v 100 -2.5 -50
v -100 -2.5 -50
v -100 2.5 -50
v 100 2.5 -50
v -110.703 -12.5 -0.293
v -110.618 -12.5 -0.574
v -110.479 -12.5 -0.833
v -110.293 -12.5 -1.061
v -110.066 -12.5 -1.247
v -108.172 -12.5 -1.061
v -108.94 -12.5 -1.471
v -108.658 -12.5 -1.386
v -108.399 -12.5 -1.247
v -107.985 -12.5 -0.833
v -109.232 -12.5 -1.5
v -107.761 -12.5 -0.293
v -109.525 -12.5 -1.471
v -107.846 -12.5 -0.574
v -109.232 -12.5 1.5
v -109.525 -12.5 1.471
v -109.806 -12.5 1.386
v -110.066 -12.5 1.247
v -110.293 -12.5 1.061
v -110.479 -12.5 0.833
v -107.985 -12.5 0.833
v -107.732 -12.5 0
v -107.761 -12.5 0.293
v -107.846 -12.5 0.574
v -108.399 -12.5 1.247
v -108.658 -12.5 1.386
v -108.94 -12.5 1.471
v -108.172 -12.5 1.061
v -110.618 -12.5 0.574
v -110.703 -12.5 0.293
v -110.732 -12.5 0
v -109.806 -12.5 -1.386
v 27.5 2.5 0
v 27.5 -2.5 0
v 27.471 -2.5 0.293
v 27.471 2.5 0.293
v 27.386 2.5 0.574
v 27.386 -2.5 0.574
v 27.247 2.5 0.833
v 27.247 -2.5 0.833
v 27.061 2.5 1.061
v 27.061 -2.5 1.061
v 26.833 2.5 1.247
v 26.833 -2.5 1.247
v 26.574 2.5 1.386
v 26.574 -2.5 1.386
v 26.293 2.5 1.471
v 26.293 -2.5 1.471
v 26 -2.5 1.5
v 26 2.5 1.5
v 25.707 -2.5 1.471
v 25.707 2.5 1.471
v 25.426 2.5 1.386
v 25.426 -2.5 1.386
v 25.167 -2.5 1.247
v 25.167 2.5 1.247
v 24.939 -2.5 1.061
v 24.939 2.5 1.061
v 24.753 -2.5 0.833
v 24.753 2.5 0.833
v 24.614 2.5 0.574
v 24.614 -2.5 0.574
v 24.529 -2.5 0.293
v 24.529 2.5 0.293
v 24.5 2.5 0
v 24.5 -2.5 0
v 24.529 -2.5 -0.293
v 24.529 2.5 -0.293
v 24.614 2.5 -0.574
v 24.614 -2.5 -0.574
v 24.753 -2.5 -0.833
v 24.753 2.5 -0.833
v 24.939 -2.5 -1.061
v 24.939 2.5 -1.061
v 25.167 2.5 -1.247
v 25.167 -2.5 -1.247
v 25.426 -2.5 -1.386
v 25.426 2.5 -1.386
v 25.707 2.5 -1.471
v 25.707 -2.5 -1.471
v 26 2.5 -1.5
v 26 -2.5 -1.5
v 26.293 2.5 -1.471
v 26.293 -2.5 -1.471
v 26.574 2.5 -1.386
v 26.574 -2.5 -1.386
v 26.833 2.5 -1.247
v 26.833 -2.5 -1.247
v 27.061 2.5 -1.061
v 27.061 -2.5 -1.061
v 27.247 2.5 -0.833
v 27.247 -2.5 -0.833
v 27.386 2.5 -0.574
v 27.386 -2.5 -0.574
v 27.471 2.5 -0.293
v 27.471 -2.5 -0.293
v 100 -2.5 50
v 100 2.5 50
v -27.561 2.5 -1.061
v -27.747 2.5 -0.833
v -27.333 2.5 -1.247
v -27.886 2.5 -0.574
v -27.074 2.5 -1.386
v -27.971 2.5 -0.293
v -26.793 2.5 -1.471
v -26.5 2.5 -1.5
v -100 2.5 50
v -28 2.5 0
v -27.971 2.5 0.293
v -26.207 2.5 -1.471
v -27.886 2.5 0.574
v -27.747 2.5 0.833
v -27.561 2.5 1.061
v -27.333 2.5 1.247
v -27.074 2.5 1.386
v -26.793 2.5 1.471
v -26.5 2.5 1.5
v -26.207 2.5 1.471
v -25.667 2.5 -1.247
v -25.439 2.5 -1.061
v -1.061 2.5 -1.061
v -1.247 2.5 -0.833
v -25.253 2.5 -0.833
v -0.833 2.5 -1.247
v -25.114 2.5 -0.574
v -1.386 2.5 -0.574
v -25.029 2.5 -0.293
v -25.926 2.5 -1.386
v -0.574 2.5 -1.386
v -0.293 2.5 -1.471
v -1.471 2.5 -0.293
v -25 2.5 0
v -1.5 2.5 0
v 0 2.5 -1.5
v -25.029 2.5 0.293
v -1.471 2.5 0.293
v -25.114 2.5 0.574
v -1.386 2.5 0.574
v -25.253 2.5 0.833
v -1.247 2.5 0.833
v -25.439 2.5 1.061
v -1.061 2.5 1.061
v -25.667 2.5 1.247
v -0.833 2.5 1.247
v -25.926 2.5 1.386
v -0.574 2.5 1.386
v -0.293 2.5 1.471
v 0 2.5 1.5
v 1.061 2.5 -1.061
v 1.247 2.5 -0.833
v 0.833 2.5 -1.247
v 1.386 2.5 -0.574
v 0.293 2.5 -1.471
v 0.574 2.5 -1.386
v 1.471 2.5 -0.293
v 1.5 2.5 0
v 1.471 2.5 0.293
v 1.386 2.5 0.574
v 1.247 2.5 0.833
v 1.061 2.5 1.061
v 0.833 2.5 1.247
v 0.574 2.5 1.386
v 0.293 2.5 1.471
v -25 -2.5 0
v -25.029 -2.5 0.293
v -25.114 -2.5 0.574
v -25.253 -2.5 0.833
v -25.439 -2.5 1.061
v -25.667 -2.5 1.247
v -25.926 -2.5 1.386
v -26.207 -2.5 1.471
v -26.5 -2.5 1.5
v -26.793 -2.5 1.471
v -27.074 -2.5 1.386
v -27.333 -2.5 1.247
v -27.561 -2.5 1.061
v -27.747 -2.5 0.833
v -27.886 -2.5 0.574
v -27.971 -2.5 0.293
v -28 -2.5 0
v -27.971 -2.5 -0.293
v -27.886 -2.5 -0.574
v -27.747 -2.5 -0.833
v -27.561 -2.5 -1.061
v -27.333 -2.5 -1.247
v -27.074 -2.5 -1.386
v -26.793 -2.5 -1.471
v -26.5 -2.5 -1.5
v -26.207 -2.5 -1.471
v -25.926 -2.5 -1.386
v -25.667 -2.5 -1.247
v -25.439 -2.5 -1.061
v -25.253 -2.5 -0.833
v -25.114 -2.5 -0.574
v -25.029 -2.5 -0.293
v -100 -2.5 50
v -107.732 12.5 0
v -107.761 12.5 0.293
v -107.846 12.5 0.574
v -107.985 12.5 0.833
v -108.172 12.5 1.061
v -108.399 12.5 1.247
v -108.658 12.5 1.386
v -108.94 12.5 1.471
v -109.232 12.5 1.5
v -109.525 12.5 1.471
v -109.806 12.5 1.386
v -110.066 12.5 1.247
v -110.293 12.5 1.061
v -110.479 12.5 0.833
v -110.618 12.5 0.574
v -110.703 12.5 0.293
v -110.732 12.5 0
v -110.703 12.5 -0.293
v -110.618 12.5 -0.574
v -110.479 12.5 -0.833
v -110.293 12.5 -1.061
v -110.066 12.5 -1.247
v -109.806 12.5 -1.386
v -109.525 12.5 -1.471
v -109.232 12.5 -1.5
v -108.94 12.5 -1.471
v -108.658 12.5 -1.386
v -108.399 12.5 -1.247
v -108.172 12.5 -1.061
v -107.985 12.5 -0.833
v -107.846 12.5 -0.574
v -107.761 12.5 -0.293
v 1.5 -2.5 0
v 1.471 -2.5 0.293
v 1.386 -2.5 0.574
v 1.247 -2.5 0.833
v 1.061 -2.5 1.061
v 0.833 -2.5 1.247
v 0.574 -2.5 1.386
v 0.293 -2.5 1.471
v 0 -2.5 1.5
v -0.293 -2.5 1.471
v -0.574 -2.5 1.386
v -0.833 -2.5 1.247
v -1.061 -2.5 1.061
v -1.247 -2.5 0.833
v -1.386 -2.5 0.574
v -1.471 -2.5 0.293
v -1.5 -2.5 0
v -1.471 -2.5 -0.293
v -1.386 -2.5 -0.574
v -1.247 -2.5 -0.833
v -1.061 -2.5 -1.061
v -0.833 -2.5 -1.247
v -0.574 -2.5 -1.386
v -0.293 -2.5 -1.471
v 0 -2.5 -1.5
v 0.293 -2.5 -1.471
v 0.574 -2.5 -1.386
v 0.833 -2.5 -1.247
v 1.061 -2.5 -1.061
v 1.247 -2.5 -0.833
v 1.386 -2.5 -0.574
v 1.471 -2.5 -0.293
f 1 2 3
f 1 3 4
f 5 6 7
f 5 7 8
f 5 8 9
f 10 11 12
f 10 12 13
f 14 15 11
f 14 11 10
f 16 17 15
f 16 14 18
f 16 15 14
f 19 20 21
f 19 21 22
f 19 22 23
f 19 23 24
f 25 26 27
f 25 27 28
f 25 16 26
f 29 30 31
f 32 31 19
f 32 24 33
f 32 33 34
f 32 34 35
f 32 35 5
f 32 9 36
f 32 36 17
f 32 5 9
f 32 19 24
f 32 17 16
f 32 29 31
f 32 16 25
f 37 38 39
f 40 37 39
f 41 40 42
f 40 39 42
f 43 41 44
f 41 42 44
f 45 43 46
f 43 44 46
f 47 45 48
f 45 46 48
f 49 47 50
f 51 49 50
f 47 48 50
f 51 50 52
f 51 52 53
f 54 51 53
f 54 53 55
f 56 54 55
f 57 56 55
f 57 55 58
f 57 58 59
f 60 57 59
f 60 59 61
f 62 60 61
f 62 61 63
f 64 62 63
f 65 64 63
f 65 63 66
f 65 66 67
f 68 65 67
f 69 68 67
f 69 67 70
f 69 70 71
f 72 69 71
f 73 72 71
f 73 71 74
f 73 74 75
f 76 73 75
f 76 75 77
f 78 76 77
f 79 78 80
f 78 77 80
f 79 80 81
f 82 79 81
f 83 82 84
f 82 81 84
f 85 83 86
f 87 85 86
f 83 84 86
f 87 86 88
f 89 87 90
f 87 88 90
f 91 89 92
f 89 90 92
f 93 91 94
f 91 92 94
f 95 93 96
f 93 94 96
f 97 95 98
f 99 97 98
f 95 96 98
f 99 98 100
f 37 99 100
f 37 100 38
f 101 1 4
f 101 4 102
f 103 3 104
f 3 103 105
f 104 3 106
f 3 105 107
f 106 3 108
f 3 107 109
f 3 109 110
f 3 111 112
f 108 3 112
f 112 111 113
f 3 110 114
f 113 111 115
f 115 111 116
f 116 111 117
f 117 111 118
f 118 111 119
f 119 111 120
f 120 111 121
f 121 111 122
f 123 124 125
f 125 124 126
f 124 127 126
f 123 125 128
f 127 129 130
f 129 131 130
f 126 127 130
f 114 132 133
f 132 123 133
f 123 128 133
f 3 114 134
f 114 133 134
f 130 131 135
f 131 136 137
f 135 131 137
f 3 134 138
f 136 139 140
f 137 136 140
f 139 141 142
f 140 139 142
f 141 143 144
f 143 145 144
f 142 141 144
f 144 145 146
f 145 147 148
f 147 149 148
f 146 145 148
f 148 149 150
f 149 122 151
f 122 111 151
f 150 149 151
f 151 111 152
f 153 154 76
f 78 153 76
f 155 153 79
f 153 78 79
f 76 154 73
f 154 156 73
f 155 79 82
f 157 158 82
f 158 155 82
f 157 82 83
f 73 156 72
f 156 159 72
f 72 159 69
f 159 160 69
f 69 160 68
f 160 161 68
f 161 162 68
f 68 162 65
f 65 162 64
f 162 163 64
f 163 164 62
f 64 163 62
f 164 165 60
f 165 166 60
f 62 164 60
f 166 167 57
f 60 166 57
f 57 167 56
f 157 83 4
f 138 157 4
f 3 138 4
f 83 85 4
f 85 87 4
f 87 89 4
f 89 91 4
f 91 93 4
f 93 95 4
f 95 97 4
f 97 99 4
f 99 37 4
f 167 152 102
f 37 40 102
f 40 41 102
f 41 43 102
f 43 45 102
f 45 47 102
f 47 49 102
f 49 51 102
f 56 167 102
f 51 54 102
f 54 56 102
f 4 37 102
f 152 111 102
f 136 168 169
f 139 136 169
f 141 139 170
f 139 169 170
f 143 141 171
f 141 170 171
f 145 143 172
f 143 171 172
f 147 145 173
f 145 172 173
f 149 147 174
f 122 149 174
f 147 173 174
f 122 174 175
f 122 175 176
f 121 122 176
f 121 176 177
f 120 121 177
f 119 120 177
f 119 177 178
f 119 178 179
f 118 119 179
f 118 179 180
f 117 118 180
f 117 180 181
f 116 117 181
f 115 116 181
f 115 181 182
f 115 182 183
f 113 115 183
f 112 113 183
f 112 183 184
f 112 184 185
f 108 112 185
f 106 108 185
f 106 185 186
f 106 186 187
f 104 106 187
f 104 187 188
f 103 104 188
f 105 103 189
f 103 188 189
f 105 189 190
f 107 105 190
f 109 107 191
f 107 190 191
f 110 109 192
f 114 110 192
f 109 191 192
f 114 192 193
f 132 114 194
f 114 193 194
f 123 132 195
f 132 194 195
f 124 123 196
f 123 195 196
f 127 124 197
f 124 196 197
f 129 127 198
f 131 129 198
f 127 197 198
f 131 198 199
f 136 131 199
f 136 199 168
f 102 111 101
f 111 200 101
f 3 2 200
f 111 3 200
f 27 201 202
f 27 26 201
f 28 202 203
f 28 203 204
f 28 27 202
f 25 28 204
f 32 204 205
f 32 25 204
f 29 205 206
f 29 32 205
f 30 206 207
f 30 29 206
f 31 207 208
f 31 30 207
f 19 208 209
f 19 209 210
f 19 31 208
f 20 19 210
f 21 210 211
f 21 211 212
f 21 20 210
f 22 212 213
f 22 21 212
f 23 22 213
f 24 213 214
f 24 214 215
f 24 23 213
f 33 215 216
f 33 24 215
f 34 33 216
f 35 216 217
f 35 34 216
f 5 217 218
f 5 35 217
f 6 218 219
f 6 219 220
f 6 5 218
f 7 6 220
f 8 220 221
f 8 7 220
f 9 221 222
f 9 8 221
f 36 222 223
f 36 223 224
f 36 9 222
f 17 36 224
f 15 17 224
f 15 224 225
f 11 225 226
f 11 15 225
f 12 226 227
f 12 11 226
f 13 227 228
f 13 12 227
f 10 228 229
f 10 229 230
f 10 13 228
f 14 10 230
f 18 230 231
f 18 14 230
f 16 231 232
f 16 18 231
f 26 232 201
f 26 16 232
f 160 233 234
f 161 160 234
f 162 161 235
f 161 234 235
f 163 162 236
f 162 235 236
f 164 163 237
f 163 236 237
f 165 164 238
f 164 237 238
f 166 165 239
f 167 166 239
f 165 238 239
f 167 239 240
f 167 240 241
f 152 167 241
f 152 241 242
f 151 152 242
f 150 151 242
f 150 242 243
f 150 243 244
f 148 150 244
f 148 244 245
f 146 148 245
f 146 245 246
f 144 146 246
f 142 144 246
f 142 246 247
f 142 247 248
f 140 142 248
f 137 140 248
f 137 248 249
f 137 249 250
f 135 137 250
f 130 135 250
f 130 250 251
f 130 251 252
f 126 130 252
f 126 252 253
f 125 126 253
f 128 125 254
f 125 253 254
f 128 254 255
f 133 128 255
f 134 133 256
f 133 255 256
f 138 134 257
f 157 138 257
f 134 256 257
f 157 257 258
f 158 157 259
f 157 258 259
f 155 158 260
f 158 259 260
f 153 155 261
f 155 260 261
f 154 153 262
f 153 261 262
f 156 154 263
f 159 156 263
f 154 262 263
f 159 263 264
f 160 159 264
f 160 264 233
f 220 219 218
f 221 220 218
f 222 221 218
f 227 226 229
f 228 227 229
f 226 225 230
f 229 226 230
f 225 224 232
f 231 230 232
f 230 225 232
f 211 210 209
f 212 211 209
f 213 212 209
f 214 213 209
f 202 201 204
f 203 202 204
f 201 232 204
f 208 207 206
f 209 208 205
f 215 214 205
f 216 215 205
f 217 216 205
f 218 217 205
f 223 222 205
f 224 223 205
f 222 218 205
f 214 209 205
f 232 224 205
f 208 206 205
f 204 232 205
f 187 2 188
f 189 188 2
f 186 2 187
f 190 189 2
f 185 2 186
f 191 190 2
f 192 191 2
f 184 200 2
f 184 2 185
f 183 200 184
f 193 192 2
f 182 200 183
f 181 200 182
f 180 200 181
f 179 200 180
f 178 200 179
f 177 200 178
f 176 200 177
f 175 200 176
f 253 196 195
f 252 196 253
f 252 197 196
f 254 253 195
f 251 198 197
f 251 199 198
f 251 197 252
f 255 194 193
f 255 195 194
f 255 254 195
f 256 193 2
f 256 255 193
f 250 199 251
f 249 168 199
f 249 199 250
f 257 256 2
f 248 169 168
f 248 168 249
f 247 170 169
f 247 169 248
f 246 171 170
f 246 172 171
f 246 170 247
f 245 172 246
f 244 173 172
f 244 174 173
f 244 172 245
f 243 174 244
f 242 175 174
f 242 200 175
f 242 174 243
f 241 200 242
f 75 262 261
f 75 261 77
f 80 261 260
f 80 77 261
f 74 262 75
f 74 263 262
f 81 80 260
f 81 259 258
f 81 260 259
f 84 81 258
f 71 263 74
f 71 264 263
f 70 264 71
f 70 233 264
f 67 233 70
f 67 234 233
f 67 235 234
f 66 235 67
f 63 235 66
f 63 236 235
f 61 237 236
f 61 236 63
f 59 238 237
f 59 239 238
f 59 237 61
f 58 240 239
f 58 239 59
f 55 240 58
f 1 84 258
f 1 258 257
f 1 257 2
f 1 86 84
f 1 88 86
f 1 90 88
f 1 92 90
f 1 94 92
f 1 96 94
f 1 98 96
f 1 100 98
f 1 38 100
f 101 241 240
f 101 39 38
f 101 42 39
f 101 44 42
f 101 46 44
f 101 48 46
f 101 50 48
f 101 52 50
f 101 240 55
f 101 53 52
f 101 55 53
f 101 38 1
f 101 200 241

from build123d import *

# Parameters (mm, degrees)
F0_W     = 200
F0_H     = 100
F1_DEPTH = 2.5
F2_R     = 1.5
F3_DEPTH = 25
F4_R     = 1.5
F5_DEPTH = 12.5


with BuildPart() as f1:
    # F0 (on Front) → F1 (new body, symmetric)
    with BuildSketch(Plane.XZ):
        Rectangle(F0_W, F0_H)
    extrude(amount=F1_DEPTH, both=True)

    # F2 (on face) → F3 (cut)
    with BuildSketch(Plane.XZ.offset(2.5)):
        with Locations((-26.5, 0)):
            Circle(F2_R)
        Circle(F2_R)
        with Locations((26, 0)):
            Circle(F2_R)
    extrude(amount=-F3_DEPTH, mode=Mode.SUBTRACT)


with BuildPart() as f5:
    # F4 (on Front) → F5 (new body, symmetric)
    with BuildSketch(Plane.XZ):
        with Locations((-109.232197, 0)):
            Circle(F4_R)
    extrude(amount=F5_DEPTH, both=True)


solid = Compound([f1.part, f5.part])
